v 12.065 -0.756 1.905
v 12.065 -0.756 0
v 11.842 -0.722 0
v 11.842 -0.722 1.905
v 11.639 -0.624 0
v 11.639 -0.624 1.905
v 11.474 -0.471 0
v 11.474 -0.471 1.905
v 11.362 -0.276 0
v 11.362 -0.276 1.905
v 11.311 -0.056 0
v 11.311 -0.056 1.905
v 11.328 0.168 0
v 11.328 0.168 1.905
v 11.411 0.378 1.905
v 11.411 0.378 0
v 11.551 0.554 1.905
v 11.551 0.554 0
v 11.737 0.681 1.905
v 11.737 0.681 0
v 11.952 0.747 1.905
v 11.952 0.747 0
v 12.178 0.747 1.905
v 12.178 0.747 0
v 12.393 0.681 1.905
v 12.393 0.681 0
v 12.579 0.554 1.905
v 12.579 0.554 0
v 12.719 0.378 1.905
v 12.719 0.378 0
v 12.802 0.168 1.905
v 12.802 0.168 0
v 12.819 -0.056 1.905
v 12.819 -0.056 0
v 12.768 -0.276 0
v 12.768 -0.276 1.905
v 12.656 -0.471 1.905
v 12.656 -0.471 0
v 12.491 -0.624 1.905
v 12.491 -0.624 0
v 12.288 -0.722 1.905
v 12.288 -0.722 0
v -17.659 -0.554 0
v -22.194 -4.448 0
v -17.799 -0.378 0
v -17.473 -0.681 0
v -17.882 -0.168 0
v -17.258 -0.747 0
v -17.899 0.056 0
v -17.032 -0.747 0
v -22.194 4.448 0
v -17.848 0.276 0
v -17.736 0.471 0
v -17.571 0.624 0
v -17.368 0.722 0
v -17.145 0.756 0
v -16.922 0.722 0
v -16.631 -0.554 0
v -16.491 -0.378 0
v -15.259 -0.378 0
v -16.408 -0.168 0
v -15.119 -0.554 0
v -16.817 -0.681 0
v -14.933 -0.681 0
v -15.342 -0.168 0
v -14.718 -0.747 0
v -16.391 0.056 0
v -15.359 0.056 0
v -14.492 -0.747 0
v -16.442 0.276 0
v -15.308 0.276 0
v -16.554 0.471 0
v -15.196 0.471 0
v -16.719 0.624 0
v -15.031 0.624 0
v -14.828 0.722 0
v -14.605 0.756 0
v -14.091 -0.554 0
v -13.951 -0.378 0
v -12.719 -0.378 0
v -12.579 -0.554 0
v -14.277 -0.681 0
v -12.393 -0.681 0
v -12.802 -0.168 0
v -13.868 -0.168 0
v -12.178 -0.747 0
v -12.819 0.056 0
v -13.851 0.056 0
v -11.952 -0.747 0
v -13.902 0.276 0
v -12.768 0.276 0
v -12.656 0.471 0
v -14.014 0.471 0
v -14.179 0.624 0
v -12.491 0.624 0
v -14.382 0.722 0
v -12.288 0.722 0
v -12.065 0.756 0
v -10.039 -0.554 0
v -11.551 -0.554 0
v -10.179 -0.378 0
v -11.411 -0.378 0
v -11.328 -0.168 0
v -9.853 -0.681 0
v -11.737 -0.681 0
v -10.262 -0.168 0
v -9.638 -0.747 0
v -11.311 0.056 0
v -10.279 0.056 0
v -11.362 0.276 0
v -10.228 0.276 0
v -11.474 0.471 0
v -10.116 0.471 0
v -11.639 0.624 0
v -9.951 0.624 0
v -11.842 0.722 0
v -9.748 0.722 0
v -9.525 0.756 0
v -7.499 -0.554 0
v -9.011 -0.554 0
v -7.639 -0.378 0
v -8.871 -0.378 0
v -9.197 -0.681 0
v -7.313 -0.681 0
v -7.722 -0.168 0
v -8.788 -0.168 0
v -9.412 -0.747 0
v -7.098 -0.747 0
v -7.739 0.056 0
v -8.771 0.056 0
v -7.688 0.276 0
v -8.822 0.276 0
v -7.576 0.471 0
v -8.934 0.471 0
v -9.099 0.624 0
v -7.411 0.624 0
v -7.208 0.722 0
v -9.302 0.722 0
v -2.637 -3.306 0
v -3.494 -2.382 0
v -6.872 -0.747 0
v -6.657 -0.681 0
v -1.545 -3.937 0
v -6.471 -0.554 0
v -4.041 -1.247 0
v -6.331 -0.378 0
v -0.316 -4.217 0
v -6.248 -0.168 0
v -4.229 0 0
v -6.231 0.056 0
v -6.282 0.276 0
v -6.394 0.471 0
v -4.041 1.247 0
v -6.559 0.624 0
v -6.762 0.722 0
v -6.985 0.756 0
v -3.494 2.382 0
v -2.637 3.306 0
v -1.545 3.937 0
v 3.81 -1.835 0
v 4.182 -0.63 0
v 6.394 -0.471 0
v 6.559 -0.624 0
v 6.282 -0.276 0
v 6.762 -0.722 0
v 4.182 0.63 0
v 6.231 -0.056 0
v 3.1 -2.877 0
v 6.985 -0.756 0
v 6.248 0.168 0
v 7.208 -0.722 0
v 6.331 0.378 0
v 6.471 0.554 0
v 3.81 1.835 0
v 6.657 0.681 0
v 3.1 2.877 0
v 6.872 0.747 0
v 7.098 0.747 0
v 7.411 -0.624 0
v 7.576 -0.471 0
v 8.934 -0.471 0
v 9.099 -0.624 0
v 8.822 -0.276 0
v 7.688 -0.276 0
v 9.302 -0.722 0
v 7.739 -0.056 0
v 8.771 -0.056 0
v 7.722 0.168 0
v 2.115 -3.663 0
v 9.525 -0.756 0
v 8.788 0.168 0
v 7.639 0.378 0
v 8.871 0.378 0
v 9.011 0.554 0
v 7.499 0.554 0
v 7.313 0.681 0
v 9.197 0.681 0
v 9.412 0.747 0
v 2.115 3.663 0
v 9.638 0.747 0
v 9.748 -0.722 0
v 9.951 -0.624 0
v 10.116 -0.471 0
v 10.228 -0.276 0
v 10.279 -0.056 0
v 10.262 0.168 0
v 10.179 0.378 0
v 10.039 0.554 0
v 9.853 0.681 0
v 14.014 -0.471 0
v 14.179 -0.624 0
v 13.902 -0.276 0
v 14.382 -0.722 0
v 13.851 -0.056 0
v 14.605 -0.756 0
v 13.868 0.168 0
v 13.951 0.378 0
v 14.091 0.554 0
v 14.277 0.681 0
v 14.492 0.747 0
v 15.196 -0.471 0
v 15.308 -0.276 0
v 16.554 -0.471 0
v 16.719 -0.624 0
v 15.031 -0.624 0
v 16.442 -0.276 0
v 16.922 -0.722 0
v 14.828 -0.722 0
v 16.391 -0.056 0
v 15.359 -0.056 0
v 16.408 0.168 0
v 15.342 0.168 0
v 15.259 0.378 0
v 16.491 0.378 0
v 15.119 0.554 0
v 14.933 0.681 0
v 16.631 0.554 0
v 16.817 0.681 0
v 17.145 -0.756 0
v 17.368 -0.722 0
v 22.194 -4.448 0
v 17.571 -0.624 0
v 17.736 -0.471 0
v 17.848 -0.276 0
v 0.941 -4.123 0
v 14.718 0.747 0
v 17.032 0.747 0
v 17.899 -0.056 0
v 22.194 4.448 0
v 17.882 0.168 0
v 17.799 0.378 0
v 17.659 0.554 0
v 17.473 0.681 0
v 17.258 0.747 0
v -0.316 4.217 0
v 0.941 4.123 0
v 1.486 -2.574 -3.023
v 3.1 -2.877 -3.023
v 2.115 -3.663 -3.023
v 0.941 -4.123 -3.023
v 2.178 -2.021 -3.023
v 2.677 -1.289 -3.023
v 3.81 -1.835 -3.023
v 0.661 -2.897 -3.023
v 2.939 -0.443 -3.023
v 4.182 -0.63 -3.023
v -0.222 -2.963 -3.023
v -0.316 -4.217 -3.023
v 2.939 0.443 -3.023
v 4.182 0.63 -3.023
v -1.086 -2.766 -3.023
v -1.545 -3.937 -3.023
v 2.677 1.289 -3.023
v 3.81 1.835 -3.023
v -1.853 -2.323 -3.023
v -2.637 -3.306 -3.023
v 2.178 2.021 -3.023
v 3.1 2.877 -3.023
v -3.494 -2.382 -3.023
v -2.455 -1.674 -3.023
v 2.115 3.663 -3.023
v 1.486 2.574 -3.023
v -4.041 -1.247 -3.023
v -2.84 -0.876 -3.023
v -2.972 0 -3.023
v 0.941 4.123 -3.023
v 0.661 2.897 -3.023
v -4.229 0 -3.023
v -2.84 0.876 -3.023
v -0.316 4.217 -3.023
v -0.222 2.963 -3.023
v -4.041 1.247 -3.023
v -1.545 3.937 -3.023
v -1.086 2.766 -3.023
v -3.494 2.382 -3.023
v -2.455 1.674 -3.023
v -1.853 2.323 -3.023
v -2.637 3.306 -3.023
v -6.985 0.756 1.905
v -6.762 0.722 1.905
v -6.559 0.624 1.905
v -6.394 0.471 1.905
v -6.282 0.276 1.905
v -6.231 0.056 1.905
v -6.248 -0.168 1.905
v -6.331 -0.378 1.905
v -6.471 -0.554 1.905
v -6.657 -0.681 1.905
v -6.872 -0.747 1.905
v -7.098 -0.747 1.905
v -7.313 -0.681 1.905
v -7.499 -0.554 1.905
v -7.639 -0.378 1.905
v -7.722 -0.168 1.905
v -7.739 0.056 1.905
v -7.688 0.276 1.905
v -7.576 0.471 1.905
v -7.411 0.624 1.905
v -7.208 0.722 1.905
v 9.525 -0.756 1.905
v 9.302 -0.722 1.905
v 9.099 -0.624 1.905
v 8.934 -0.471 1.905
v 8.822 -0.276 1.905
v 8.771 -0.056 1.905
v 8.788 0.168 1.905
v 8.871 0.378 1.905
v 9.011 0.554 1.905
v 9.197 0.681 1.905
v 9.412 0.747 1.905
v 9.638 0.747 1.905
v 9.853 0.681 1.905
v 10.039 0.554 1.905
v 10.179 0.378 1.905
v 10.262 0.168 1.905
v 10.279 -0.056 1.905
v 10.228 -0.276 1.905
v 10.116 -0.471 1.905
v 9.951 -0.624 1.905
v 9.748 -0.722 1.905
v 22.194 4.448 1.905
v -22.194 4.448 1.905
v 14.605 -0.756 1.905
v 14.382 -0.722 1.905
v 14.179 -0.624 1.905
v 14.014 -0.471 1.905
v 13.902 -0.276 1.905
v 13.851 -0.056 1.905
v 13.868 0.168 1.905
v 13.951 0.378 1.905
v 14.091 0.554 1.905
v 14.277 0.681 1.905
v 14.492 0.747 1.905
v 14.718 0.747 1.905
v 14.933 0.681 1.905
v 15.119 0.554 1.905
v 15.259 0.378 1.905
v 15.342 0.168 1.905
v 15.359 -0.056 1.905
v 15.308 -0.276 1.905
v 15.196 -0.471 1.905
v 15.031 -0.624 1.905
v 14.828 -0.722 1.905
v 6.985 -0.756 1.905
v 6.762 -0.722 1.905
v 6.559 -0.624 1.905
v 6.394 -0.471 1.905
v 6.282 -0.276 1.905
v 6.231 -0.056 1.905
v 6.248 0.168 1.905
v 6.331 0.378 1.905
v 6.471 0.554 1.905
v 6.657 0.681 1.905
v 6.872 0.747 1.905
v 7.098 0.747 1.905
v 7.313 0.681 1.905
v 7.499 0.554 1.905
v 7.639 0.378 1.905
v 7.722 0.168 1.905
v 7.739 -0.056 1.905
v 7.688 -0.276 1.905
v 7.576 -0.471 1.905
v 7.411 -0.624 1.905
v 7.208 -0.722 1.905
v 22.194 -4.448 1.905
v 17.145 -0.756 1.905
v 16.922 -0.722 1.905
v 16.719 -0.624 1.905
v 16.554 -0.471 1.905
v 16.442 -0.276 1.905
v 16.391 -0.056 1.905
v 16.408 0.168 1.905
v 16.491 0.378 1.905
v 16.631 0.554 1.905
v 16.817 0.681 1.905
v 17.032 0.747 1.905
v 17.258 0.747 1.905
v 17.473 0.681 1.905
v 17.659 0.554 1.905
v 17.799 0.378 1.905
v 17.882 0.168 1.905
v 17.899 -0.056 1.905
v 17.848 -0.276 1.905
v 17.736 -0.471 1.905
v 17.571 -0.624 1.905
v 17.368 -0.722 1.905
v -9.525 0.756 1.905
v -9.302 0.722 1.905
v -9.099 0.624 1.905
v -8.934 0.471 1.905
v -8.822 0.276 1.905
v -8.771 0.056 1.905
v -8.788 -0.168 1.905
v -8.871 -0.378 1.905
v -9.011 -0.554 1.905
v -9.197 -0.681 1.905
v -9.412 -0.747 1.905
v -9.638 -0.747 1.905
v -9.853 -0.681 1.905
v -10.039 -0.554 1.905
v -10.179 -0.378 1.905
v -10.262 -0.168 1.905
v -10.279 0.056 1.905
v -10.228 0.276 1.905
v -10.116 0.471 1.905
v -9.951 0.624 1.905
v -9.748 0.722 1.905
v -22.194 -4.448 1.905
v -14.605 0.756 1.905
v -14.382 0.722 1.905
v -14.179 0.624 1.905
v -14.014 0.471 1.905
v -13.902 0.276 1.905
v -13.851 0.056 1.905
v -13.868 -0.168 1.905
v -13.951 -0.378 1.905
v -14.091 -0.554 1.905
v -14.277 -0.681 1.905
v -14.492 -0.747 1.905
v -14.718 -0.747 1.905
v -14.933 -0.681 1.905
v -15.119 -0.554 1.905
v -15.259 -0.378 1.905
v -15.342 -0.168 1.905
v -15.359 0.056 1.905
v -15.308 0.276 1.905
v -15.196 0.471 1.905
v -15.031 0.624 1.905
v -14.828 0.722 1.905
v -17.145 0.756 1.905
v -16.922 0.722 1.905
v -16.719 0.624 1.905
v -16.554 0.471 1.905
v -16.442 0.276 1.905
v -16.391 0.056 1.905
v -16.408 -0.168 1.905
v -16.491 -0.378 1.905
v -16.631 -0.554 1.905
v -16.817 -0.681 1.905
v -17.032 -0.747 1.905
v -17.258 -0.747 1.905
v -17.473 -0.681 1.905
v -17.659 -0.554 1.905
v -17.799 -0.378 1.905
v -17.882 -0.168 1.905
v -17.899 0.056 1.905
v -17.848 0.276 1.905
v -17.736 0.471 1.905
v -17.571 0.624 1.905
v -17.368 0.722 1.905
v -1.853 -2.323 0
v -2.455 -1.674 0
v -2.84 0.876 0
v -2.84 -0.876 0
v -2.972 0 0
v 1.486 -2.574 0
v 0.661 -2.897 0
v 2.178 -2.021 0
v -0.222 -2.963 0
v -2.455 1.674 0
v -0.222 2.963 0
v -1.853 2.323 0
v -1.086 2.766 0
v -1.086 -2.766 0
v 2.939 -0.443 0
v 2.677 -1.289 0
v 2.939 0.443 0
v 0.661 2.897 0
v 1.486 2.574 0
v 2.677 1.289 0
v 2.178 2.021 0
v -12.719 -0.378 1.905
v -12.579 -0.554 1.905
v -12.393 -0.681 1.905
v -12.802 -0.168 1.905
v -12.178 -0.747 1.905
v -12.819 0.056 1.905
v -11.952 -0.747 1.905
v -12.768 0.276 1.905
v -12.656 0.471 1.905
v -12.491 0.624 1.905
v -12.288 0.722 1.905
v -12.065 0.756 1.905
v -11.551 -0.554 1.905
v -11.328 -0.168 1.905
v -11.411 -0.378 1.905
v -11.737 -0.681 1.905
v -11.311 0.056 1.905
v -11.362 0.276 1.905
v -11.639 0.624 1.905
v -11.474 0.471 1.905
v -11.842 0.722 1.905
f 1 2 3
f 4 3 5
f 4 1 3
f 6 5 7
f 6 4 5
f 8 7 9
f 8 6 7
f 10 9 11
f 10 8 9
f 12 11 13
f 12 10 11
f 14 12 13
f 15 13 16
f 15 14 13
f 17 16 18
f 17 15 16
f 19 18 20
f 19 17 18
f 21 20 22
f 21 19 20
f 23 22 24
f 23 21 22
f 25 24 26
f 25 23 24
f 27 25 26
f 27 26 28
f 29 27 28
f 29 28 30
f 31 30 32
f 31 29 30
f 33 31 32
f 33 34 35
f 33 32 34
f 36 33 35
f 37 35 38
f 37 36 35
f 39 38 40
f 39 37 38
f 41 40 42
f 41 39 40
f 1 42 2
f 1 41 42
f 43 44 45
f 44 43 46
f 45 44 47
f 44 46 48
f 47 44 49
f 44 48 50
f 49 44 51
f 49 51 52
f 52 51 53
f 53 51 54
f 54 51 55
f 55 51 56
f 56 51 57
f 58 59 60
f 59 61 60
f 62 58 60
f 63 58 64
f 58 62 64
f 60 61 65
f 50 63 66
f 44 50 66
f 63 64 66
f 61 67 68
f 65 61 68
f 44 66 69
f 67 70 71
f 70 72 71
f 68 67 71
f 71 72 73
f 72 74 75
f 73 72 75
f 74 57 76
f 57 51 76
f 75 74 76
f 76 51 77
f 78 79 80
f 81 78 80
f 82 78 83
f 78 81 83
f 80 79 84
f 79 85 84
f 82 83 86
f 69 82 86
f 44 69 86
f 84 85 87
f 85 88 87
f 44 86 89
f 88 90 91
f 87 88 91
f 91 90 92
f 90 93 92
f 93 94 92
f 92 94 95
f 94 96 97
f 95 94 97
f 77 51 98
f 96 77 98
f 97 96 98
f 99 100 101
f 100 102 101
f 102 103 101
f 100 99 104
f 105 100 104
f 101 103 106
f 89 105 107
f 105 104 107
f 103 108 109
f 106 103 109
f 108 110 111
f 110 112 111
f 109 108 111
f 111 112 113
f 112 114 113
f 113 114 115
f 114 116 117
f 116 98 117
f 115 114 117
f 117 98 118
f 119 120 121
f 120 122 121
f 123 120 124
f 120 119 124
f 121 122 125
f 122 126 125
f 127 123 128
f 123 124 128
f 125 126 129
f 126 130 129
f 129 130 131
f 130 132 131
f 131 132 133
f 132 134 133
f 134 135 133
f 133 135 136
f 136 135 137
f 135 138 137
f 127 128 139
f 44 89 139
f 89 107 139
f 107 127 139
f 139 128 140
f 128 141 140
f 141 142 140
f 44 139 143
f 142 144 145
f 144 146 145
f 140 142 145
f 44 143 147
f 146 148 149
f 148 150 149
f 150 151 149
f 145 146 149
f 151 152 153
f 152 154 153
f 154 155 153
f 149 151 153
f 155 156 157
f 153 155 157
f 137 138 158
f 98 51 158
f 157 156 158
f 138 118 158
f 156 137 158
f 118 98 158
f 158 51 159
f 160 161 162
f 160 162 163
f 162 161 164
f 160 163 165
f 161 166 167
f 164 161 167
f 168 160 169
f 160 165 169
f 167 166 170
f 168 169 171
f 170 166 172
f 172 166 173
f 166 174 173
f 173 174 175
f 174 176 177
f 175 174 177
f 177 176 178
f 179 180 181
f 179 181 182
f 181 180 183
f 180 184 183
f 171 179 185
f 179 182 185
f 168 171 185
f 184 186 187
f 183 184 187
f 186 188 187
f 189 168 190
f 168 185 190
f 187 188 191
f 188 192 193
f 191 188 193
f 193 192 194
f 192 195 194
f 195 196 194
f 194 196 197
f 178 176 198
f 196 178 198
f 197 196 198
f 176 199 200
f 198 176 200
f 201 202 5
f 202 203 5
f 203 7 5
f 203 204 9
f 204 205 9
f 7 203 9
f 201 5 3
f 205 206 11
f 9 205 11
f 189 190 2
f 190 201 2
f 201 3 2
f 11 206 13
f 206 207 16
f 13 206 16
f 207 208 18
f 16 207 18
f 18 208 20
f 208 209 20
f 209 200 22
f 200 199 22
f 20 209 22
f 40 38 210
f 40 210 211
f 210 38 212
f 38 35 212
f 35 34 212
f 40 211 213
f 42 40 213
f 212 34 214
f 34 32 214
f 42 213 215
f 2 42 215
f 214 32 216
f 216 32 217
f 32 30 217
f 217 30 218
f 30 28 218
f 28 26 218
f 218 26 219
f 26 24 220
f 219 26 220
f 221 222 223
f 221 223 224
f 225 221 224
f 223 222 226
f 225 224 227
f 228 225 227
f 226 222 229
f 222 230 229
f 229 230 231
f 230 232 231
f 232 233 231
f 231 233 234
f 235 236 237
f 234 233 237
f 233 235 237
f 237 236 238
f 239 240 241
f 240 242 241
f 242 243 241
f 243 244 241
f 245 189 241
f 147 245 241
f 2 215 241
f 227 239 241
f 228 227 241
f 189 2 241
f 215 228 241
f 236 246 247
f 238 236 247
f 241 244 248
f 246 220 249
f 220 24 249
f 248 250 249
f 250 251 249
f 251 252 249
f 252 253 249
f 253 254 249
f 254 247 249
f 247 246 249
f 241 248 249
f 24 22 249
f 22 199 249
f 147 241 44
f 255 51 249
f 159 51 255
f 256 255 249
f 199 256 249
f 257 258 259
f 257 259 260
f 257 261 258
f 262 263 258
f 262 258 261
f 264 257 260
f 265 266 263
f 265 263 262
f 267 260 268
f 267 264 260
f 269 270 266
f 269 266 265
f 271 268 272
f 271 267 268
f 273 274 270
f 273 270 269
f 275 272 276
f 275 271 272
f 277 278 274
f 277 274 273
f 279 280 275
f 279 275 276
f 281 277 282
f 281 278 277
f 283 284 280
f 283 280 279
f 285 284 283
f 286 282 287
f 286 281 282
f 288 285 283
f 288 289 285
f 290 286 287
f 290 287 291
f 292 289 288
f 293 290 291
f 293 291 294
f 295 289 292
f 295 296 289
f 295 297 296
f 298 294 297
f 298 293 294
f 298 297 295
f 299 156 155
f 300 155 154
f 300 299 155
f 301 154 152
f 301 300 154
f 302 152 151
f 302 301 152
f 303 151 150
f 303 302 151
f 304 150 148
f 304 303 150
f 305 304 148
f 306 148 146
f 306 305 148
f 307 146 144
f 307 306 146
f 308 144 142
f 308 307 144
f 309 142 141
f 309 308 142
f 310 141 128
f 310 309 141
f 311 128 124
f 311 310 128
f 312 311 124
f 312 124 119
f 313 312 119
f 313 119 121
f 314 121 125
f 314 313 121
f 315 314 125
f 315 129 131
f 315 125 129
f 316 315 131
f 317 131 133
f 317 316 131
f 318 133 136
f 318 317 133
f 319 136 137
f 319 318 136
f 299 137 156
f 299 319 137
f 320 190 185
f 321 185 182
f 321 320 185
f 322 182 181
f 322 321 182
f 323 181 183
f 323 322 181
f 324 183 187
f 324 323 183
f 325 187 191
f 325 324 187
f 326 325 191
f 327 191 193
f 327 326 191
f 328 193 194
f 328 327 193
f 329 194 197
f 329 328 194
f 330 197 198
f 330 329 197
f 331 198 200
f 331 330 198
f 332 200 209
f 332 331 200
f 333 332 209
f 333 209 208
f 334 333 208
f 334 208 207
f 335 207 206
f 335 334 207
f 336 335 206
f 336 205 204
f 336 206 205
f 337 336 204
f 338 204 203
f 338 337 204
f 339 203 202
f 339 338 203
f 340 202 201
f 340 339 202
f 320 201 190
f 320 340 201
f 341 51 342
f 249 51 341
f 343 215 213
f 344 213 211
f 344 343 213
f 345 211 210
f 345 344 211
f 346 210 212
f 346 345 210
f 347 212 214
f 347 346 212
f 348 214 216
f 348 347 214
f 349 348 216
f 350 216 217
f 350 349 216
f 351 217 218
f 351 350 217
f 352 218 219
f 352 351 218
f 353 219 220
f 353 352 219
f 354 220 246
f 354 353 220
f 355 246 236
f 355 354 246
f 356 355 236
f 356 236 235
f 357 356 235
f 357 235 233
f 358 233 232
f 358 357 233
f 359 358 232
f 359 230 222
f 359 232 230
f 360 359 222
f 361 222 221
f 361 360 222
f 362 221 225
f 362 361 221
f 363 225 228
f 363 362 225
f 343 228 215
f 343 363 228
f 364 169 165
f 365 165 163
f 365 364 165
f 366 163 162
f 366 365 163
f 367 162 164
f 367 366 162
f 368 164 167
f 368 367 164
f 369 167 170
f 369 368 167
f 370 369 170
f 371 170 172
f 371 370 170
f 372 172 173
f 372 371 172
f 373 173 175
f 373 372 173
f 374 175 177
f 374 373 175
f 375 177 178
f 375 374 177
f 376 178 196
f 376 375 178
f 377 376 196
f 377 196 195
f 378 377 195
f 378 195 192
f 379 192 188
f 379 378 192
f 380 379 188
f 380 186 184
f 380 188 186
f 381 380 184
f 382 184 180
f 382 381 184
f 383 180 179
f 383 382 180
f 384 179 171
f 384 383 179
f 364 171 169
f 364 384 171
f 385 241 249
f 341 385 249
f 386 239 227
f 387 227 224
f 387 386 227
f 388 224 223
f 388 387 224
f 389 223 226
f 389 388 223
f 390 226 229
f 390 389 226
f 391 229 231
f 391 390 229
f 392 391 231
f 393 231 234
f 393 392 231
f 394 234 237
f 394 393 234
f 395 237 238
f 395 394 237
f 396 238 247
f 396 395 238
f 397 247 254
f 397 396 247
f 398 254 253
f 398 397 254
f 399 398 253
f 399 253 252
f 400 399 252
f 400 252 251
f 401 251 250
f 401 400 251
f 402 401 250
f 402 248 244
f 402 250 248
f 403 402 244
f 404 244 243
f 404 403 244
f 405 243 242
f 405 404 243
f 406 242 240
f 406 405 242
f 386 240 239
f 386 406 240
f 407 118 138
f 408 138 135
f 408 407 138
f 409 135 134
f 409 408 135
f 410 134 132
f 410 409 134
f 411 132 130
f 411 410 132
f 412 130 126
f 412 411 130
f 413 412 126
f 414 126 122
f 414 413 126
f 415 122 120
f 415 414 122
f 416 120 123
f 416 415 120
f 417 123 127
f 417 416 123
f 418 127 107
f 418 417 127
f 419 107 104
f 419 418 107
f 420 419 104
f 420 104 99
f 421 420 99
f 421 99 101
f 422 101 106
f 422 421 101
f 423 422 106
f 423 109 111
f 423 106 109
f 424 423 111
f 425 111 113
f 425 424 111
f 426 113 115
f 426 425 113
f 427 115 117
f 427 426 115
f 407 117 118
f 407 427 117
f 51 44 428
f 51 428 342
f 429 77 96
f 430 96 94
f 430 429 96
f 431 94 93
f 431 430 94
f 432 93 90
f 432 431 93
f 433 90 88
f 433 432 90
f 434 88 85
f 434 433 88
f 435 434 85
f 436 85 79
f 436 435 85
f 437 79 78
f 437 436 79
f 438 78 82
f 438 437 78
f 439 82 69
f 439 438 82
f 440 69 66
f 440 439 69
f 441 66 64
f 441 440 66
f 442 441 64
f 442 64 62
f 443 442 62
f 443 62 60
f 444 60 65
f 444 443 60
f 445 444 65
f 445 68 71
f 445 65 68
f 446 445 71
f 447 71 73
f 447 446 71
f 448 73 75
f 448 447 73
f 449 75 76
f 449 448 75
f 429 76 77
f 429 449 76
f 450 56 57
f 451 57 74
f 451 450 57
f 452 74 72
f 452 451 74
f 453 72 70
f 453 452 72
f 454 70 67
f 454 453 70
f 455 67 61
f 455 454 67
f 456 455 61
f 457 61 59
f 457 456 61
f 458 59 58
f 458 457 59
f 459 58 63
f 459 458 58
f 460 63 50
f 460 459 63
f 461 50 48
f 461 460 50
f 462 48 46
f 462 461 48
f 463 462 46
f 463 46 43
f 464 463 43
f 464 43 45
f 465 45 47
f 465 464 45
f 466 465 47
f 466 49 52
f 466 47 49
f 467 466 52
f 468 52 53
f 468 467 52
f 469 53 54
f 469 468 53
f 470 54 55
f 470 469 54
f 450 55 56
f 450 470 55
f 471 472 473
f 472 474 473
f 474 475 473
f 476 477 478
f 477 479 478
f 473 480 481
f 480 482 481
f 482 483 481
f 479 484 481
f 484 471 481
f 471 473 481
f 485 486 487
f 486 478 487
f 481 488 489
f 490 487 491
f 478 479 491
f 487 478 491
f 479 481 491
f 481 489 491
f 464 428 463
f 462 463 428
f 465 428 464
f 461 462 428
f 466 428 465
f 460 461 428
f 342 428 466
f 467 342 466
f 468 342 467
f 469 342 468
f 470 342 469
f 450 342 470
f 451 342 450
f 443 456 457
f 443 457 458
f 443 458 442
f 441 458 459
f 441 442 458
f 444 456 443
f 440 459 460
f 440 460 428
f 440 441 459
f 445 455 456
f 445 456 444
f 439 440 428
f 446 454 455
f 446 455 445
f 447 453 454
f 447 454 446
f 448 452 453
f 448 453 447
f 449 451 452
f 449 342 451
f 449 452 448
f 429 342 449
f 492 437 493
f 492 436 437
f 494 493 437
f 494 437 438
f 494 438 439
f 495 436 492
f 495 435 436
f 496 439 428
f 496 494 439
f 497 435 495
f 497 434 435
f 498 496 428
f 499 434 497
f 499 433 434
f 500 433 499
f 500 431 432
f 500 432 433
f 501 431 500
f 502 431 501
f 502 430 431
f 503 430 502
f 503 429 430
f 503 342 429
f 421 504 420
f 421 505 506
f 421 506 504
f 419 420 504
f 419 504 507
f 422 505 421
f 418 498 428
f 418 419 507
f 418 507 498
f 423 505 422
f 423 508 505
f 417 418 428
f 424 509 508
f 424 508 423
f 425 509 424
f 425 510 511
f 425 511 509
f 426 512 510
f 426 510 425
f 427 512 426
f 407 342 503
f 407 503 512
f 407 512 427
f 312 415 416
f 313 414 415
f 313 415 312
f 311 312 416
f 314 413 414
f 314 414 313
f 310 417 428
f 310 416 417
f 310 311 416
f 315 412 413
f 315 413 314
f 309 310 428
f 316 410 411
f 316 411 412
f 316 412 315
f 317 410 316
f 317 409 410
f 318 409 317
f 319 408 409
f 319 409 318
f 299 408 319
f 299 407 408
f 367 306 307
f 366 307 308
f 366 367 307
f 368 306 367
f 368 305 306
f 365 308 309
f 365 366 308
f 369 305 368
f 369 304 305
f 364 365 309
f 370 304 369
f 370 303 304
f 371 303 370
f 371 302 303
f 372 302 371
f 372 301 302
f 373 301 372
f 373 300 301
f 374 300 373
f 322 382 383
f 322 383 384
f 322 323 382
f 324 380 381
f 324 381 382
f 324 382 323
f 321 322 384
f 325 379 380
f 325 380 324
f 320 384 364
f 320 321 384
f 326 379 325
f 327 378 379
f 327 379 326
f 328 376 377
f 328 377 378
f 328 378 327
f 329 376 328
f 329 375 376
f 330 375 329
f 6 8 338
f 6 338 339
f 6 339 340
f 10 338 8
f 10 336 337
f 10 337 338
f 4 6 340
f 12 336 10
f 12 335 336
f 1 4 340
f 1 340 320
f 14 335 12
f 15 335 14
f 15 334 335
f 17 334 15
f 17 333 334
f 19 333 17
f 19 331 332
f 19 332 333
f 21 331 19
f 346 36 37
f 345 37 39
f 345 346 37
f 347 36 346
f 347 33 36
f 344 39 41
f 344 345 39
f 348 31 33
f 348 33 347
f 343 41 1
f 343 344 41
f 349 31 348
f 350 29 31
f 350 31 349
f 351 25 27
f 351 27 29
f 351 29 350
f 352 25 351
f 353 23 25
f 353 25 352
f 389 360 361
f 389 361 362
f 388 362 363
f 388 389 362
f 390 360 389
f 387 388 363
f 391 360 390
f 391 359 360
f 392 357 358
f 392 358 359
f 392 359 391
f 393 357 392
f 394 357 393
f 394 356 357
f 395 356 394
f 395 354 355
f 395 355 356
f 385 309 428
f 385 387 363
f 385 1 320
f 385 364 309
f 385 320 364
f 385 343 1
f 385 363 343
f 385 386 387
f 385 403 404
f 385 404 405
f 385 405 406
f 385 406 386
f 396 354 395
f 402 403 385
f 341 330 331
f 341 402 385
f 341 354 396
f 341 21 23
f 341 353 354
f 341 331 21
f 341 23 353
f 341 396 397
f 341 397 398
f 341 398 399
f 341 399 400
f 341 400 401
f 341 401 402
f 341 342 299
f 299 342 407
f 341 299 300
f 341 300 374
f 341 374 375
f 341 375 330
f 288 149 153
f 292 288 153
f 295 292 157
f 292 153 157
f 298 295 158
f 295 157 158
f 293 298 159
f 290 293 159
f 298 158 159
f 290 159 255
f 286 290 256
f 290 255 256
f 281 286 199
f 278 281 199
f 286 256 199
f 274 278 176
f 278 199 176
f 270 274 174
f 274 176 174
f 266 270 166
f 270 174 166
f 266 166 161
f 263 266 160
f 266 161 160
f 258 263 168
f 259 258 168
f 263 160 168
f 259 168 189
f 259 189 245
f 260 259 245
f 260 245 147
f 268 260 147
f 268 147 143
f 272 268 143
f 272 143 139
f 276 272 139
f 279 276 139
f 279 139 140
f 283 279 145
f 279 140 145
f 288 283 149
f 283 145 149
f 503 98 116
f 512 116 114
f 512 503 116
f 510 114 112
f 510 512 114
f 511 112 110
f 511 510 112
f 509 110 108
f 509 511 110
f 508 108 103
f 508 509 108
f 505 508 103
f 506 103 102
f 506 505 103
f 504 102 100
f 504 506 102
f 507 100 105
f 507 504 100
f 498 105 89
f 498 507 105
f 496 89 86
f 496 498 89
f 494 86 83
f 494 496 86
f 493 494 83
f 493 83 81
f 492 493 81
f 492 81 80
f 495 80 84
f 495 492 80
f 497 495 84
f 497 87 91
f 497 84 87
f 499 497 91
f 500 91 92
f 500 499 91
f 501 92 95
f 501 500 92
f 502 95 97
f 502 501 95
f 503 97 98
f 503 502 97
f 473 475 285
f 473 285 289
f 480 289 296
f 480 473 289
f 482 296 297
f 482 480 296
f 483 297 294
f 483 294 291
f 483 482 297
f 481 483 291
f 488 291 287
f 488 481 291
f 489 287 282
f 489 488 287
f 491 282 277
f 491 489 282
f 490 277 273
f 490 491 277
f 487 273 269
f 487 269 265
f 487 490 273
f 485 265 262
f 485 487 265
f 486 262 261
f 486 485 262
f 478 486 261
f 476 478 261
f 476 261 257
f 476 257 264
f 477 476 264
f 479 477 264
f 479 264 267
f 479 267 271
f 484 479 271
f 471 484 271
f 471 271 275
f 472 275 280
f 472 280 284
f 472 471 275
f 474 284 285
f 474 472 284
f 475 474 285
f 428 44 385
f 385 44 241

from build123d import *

# Parameters (mm, degrees)
SKETCH1_W         = 44.38767267
SKETCH1_H         = 8.89569146
EXTRUDE1_DEPTH    = 1.905
SKETCH2_R         = 4.2291
SKETCH2_R_2       = 2.9718
EXTRUDE2_DEPTH    = 3.0226
LPATTERN2_COUNT   = 5
LPATTERN2_PITCH   = 2.54
CIRPATTERN2_COUNT = 2


with BuildPart() as part:
    # Sketch1 → Extrude1 (new body)
    with BuildSketch(Plane.XY):
        Rectangle(SKETCH1_W, SKETCH1_H)
    extrude(amount=EXTRUDE1_DEPTH)

    # Sketch2 → Extrude2 (add)
    with BuildSketch(Plane(origin=(0, 0, 0), x_dir=(-1, 0, 0), z_dir=(0, 0, -1))):
        Circle(SKETCH2_R)
        Circle(SKETCH2_R_2, mode=Mode.SUBTRACT)
    extrude(amount=EXTRUDE2_DEPTH)

    # Sketch4 → #53 (0.0595) Diameter Hole1 (revolve, cut)
    with BuildSketch(Plane(origin=(6.985, 0, 1.905), x_dir=(0, -1, 0), z_dir=(1, 0, 0))):
        Polygon((0, 0), (0, 5.534040327), (0.75565, 5.08), (0.75565, 0), align=None)
    f_53_0_0595_diameter_hole1 = revolve(axis=Axis((6.985, 0, 8.255), (0, 0, -1)), mode=Mode.SUBTRACT)

    # LPattern2: #53 (0.0595) Diameter Hole1 ×5
    with Locations(*[(i * LPATTERN2_PITCH, 0, 0) for i in range(1, LPATTERN2_COUNT)]):
        add(f_53_0_0595_diameter_hole1, mode=Mode.SUBTRACT)

    # CirPattern2: #53 (0.0595) Diameter Hole1 ×2 about axis
    cirpattern2_axis = Axis((0, 0, 0), (0, 0, 1))
    for i in range(1, CIRPATTERN2_COUNT):
        add(f_53_0_0595_diameter_hole1.rotate(cirpattern2_axis, i * 360 / CIRPATTERN2_COUNT), mode=Mode.SUBTRACT)

    # CirPattern2 copy 1 sketch → CirPattern2 copy 1 (revolve, cut)
    with BuildSketch(Plane(origin=(-9.525, 0, 1.905), x_dir=(0, 1, 0), z_dir=(-1, 0, 0))):
        Polygon((0, 0), (0, 5.534040327), (0.75565, 5.08), (0.75565, 0), align=None)
    revolve(axis=Axis((-9.525, 0, 8.255), (0, 0, -1)), mode=Mode.SUBTRACT)

    # CirPattern2 copy 2 sketch → CirPattern2 copy 2 (revolve, cut)
    with BuildSketch(Plane(origin=(-12.065, 0, 1.905), x_dir=(0, 1, 0), z_dir=(-1, 0, 0))):
        Polygon((0, 0), (0, 5.534040327), (0.75565, 5.08), (0.75565, 0), align=None)
    revolve(axis=Axis((-12.065, 0, 8.255), (0, 0, -1)), mode=Mode.SUBTRACT)

    # CirPattern2 copy 3 sketch → CirPattern2 copy 3 (revolve, cut)
    with BuildSketch(Plane(origin=(-14.605, 0, 1.905), x_dir=(0, 1, 0), z_dir=(-1, 0, 0))):
        Polygon((0, 0), (0, 5.534040327), (0.75565, 5.08), (0.75565, 0), align=None)
    revolve(axis=Axis((-14.605, 0, 8.255), (0, 0, -1)), mode=Mode.SUBTRACT)

    # CirPattern2 copy 4 sketch → CirPattern2 copy 4 (revolve, cut)
    with BuildSketch(Plane(origin=(-17.145, 0, 1.905), x_dir=(0, 1, 0), z_dir=(-1, 0, 0))):
        Polygon((0, 0), (0, 5.534040327), (0.75565, 5.08), (0.75565, 0), align=None)
    revolve(axis=Axis((-17.145, 0, 8.255), (0, 0, -1)), mode=Mode.SUBTRACT)


solid = part.part
